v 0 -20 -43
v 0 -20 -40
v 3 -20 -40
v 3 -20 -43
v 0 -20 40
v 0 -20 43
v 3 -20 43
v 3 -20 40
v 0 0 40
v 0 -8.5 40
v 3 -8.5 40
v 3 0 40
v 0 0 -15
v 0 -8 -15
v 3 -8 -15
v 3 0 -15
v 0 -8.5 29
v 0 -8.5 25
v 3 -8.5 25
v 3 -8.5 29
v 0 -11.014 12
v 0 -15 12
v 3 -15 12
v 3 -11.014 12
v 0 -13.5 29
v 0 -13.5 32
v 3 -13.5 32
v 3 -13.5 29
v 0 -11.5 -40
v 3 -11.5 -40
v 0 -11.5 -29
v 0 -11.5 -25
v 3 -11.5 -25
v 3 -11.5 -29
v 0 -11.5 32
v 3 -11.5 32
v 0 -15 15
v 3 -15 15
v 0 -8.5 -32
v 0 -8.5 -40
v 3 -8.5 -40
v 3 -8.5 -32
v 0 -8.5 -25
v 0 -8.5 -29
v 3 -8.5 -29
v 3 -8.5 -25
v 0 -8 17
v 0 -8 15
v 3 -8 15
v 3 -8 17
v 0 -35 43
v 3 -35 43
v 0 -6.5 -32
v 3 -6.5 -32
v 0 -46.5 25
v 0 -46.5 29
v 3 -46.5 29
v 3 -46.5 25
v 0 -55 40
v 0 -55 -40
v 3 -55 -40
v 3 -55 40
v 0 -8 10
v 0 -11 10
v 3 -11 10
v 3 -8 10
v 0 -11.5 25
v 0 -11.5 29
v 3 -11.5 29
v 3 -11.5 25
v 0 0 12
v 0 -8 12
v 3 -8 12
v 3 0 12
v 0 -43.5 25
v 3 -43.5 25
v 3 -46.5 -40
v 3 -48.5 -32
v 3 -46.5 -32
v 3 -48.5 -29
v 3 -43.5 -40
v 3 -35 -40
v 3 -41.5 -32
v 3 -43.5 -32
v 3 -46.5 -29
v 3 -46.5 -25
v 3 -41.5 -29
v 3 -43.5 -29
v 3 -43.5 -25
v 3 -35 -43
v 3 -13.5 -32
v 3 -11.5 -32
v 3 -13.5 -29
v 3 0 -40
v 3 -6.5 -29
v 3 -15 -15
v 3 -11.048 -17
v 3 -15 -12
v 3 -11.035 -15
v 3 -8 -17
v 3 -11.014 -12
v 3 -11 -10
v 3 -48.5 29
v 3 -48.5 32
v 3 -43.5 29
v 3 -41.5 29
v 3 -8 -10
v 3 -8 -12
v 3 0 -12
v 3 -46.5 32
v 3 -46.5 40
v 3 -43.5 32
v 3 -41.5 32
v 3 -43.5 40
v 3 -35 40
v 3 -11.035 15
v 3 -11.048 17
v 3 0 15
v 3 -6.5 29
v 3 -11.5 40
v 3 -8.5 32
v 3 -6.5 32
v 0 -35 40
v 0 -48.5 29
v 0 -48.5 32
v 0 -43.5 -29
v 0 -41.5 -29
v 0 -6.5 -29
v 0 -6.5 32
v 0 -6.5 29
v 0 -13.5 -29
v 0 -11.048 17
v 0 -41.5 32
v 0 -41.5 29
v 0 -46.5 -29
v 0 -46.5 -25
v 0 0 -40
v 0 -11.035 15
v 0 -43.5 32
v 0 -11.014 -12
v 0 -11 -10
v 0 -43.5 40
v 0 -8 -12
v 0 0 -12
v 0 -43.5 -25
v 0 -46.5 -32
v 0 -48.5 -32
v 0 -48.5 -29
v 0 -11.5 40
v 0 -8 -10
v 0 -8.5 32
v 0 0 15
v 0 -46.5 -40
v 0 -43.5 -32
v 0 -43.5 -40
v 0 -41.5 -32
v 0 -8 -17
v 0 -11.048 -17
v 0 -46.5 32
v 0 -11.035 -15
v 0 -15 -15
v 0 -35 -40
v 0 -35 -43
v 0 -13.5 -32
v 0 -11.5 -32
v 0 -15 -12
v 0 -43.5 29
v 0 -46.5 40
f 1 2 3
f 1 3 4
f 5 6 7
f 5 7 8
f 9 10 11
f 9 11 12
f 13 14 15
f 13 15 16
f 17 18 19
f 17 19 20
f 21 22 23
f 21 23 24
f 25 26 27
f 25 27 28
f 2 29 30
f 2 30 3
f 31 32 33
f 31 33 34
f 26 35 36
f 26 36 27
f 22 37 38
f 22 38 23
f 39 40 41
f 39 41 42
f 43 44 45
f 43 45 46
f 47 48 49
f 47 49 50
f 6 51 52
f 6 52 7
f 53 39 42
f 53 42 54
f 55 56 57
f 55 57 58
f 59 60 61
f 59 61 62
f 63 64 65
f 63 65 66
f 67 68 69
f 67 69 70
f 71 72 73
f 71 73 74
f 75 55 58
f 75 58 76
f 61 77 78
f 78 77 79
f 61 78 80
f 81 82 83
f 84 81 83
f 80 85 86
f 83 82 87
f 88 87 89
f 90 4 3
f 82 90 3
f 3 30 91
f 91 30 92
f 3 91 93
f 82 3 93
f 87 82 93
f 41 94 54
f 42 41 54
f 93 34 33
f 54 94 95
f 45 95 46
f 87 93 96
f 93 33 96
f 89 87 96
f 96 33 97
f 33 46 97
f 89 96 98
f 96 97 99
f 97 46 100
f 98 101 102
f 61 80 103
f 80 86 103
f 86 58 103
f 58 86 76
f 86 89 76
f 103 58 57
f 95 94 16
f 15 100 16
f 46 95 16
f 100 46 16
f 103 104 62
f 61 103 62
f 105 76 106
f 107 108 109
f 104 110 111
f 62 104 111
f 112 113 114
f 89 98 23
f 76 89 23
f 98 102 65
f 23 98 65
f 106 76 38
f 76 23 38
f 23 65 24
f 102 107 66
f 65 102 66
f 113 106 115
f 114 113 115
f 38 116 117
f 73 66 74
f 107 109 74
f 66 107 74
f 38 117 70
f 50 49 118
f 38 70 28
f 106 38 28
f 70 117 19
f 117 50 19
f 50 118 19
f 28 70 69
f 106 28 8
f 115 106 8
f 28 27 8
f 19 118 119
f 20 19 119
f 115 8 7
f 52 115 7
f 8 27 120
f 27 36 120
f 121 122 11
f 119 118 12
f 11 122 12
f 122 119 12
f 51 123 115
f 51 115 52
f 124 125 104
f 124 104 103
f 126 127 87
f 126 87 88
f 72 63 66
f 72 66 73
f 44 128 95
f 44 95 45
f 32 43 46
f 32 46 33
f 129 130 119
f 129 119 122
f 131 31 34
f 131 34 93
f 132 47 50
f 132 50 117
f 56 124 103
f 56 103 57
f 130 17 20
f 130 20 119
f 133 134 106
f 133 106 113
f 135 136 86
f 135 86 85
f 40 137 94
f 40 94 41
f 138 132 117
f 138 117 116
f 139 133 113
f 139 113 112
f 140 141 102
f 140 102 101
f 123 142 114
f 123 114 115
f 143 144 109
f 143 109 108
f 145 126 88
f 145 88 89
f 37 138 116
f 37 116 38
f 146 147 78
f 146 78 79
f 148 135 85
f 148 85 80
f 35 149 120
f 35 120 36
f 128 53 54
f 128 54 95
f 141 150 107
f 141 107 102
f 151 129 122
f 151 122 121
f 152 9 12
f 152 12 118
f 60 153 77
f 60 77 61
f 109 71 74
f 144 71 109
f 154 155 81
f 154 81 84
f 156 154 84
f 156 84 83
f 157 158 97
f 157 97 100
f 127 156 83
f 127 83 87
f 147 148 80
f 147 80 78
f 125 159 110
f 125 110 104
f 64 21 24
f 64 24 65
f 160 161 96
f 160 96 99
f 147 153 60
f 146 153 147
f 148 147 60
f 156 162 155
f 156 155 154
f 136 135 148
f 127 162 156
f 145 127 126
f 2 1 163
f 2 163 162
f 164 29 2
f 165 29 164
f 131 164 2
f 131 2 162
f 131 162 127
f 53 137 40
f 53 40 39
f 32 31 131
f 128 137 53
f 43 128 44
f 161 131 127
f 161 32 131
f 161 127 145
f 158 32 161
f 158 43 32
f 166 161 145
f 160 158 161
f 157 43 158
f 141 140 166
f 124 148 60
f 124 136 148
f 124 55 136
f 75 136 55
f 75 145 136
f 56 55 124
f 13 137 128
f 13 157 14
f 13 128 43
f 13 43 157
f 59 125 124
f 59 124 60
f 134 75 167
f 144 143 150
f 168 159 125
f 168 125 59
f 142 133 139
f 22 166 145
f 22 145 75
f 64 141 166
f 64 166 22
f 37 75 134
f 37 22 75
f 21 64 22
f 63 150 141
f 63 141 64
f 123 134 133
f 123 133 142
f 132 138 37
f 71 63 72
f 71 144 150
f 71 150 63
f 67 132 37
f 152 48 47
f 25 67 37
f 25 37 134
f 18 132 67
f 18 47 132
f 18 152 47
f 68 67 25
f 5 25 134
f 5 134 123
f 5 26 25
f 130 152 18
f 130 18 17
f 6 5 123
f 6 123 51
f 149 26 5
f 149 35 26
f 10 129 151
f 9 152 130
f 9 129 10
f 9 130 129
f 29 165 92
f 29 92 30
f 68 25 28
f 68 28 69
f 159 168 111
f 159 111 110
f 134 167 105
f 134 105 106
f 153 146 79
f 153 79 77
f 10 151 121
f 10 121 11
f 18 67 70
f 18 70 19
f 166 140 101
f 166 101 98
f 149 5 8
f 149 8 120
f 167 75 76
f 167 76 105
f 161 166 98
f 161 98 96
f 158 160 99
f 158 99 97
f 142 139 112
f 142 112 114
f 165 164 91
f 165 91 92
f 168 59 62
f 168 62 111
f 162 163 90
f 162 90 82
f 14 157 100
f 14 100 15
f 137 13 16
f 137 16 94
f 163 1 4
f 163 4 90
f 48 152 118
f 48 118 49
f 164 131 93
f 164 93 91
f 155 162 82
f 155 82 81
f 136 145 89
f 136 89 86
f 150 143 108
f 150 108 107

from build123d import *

# Parameters (mm, degrees)
SALIENTE_EXTRUIR1_DEPTH = 3
CORTAR_EXTRUIR1_DEPTH   = 10


with BuildPart() as part:
    # Croquis1 → Saliente-Extruir1 (new body)
    with BuildSketch(Plane(origin=(0, 0, 0), x_dir=(0, 0, -1), z_dir=(1, 0, 0))):
        Polygon((-40, 0), (40, 0), (40, -20), (43, -20), (43, -35), (40, -35), (40, -55), (-40, -55), (-40, -35), (-43, -35), (-43, -20), (-40, -20), align=None)
    extrude(amount=SALIENTE_EXTRUIR1_DEPTH)

    # Croquis2 → Cortar-Extruir1 (cut)
    with BuildSketch(Plane.ZY):
        Polygon((-40, -8.5), (-32, -8.5), (-32, -6.5), (-29, -6.5), (-29, -8.5), (-25, -8.5), (-25, -11.5), (-29, -11.5), (-29, -13.5), (-32, -13.5), (-32, -11.5), (-40, -11.5), align=None)
        Polygon((29, -11.5), (25, -11.5), (25, -8.5), (29, -8.5), (29, -6.5), (32, -6.5), (32, -8.5), (40, -8.5), (40, -11.5), (32, -11.5), (32, -13.5), (29, -13.5), align=None)
        Polygon((-12, 0), (-12, -8), (-10, -8), (-10, -11), (-12, -11.013841386), (-12, -15), (-15, -15), (-15, -11.034603466), (-17, -11.048444852), (-17, -8), (-15, -8), (-15, 0), align=None)
        Polygon((15, -11.034603466), (15, -15), (12, -15), (12, -11.013841386), (10, -11), (10, -8), (12, -8), (12, 0), (15, 0), (15, -8), (17, -8), (17, -11.048444852), align=None)
        Polygon((40, -46.5), (32, -46.5), (32, -48.5), (29, -48.5), (29, -46.5), (25, -46.5), (25, -43.5), (29, -43.5), (29, -41.5), (32, -41.5), (32, -43.5), (40, -43.5), align=None)
        Polygon((-29, -43.5), (-25, -43.5), (-25, -46.5), (-29, -46.5), (-29, -48.5), (-32, -48.5), (-32, -46.5), (-40, -46.5), (-40, -43.5), (-32, -43.5), (-32, -41.5), (-29, -41.5), align=None)
    extrude(amount=-CORTAR_EXTRUIR1_DEPTH, mode=Mode.SUBTRACT)


solid = part.part
